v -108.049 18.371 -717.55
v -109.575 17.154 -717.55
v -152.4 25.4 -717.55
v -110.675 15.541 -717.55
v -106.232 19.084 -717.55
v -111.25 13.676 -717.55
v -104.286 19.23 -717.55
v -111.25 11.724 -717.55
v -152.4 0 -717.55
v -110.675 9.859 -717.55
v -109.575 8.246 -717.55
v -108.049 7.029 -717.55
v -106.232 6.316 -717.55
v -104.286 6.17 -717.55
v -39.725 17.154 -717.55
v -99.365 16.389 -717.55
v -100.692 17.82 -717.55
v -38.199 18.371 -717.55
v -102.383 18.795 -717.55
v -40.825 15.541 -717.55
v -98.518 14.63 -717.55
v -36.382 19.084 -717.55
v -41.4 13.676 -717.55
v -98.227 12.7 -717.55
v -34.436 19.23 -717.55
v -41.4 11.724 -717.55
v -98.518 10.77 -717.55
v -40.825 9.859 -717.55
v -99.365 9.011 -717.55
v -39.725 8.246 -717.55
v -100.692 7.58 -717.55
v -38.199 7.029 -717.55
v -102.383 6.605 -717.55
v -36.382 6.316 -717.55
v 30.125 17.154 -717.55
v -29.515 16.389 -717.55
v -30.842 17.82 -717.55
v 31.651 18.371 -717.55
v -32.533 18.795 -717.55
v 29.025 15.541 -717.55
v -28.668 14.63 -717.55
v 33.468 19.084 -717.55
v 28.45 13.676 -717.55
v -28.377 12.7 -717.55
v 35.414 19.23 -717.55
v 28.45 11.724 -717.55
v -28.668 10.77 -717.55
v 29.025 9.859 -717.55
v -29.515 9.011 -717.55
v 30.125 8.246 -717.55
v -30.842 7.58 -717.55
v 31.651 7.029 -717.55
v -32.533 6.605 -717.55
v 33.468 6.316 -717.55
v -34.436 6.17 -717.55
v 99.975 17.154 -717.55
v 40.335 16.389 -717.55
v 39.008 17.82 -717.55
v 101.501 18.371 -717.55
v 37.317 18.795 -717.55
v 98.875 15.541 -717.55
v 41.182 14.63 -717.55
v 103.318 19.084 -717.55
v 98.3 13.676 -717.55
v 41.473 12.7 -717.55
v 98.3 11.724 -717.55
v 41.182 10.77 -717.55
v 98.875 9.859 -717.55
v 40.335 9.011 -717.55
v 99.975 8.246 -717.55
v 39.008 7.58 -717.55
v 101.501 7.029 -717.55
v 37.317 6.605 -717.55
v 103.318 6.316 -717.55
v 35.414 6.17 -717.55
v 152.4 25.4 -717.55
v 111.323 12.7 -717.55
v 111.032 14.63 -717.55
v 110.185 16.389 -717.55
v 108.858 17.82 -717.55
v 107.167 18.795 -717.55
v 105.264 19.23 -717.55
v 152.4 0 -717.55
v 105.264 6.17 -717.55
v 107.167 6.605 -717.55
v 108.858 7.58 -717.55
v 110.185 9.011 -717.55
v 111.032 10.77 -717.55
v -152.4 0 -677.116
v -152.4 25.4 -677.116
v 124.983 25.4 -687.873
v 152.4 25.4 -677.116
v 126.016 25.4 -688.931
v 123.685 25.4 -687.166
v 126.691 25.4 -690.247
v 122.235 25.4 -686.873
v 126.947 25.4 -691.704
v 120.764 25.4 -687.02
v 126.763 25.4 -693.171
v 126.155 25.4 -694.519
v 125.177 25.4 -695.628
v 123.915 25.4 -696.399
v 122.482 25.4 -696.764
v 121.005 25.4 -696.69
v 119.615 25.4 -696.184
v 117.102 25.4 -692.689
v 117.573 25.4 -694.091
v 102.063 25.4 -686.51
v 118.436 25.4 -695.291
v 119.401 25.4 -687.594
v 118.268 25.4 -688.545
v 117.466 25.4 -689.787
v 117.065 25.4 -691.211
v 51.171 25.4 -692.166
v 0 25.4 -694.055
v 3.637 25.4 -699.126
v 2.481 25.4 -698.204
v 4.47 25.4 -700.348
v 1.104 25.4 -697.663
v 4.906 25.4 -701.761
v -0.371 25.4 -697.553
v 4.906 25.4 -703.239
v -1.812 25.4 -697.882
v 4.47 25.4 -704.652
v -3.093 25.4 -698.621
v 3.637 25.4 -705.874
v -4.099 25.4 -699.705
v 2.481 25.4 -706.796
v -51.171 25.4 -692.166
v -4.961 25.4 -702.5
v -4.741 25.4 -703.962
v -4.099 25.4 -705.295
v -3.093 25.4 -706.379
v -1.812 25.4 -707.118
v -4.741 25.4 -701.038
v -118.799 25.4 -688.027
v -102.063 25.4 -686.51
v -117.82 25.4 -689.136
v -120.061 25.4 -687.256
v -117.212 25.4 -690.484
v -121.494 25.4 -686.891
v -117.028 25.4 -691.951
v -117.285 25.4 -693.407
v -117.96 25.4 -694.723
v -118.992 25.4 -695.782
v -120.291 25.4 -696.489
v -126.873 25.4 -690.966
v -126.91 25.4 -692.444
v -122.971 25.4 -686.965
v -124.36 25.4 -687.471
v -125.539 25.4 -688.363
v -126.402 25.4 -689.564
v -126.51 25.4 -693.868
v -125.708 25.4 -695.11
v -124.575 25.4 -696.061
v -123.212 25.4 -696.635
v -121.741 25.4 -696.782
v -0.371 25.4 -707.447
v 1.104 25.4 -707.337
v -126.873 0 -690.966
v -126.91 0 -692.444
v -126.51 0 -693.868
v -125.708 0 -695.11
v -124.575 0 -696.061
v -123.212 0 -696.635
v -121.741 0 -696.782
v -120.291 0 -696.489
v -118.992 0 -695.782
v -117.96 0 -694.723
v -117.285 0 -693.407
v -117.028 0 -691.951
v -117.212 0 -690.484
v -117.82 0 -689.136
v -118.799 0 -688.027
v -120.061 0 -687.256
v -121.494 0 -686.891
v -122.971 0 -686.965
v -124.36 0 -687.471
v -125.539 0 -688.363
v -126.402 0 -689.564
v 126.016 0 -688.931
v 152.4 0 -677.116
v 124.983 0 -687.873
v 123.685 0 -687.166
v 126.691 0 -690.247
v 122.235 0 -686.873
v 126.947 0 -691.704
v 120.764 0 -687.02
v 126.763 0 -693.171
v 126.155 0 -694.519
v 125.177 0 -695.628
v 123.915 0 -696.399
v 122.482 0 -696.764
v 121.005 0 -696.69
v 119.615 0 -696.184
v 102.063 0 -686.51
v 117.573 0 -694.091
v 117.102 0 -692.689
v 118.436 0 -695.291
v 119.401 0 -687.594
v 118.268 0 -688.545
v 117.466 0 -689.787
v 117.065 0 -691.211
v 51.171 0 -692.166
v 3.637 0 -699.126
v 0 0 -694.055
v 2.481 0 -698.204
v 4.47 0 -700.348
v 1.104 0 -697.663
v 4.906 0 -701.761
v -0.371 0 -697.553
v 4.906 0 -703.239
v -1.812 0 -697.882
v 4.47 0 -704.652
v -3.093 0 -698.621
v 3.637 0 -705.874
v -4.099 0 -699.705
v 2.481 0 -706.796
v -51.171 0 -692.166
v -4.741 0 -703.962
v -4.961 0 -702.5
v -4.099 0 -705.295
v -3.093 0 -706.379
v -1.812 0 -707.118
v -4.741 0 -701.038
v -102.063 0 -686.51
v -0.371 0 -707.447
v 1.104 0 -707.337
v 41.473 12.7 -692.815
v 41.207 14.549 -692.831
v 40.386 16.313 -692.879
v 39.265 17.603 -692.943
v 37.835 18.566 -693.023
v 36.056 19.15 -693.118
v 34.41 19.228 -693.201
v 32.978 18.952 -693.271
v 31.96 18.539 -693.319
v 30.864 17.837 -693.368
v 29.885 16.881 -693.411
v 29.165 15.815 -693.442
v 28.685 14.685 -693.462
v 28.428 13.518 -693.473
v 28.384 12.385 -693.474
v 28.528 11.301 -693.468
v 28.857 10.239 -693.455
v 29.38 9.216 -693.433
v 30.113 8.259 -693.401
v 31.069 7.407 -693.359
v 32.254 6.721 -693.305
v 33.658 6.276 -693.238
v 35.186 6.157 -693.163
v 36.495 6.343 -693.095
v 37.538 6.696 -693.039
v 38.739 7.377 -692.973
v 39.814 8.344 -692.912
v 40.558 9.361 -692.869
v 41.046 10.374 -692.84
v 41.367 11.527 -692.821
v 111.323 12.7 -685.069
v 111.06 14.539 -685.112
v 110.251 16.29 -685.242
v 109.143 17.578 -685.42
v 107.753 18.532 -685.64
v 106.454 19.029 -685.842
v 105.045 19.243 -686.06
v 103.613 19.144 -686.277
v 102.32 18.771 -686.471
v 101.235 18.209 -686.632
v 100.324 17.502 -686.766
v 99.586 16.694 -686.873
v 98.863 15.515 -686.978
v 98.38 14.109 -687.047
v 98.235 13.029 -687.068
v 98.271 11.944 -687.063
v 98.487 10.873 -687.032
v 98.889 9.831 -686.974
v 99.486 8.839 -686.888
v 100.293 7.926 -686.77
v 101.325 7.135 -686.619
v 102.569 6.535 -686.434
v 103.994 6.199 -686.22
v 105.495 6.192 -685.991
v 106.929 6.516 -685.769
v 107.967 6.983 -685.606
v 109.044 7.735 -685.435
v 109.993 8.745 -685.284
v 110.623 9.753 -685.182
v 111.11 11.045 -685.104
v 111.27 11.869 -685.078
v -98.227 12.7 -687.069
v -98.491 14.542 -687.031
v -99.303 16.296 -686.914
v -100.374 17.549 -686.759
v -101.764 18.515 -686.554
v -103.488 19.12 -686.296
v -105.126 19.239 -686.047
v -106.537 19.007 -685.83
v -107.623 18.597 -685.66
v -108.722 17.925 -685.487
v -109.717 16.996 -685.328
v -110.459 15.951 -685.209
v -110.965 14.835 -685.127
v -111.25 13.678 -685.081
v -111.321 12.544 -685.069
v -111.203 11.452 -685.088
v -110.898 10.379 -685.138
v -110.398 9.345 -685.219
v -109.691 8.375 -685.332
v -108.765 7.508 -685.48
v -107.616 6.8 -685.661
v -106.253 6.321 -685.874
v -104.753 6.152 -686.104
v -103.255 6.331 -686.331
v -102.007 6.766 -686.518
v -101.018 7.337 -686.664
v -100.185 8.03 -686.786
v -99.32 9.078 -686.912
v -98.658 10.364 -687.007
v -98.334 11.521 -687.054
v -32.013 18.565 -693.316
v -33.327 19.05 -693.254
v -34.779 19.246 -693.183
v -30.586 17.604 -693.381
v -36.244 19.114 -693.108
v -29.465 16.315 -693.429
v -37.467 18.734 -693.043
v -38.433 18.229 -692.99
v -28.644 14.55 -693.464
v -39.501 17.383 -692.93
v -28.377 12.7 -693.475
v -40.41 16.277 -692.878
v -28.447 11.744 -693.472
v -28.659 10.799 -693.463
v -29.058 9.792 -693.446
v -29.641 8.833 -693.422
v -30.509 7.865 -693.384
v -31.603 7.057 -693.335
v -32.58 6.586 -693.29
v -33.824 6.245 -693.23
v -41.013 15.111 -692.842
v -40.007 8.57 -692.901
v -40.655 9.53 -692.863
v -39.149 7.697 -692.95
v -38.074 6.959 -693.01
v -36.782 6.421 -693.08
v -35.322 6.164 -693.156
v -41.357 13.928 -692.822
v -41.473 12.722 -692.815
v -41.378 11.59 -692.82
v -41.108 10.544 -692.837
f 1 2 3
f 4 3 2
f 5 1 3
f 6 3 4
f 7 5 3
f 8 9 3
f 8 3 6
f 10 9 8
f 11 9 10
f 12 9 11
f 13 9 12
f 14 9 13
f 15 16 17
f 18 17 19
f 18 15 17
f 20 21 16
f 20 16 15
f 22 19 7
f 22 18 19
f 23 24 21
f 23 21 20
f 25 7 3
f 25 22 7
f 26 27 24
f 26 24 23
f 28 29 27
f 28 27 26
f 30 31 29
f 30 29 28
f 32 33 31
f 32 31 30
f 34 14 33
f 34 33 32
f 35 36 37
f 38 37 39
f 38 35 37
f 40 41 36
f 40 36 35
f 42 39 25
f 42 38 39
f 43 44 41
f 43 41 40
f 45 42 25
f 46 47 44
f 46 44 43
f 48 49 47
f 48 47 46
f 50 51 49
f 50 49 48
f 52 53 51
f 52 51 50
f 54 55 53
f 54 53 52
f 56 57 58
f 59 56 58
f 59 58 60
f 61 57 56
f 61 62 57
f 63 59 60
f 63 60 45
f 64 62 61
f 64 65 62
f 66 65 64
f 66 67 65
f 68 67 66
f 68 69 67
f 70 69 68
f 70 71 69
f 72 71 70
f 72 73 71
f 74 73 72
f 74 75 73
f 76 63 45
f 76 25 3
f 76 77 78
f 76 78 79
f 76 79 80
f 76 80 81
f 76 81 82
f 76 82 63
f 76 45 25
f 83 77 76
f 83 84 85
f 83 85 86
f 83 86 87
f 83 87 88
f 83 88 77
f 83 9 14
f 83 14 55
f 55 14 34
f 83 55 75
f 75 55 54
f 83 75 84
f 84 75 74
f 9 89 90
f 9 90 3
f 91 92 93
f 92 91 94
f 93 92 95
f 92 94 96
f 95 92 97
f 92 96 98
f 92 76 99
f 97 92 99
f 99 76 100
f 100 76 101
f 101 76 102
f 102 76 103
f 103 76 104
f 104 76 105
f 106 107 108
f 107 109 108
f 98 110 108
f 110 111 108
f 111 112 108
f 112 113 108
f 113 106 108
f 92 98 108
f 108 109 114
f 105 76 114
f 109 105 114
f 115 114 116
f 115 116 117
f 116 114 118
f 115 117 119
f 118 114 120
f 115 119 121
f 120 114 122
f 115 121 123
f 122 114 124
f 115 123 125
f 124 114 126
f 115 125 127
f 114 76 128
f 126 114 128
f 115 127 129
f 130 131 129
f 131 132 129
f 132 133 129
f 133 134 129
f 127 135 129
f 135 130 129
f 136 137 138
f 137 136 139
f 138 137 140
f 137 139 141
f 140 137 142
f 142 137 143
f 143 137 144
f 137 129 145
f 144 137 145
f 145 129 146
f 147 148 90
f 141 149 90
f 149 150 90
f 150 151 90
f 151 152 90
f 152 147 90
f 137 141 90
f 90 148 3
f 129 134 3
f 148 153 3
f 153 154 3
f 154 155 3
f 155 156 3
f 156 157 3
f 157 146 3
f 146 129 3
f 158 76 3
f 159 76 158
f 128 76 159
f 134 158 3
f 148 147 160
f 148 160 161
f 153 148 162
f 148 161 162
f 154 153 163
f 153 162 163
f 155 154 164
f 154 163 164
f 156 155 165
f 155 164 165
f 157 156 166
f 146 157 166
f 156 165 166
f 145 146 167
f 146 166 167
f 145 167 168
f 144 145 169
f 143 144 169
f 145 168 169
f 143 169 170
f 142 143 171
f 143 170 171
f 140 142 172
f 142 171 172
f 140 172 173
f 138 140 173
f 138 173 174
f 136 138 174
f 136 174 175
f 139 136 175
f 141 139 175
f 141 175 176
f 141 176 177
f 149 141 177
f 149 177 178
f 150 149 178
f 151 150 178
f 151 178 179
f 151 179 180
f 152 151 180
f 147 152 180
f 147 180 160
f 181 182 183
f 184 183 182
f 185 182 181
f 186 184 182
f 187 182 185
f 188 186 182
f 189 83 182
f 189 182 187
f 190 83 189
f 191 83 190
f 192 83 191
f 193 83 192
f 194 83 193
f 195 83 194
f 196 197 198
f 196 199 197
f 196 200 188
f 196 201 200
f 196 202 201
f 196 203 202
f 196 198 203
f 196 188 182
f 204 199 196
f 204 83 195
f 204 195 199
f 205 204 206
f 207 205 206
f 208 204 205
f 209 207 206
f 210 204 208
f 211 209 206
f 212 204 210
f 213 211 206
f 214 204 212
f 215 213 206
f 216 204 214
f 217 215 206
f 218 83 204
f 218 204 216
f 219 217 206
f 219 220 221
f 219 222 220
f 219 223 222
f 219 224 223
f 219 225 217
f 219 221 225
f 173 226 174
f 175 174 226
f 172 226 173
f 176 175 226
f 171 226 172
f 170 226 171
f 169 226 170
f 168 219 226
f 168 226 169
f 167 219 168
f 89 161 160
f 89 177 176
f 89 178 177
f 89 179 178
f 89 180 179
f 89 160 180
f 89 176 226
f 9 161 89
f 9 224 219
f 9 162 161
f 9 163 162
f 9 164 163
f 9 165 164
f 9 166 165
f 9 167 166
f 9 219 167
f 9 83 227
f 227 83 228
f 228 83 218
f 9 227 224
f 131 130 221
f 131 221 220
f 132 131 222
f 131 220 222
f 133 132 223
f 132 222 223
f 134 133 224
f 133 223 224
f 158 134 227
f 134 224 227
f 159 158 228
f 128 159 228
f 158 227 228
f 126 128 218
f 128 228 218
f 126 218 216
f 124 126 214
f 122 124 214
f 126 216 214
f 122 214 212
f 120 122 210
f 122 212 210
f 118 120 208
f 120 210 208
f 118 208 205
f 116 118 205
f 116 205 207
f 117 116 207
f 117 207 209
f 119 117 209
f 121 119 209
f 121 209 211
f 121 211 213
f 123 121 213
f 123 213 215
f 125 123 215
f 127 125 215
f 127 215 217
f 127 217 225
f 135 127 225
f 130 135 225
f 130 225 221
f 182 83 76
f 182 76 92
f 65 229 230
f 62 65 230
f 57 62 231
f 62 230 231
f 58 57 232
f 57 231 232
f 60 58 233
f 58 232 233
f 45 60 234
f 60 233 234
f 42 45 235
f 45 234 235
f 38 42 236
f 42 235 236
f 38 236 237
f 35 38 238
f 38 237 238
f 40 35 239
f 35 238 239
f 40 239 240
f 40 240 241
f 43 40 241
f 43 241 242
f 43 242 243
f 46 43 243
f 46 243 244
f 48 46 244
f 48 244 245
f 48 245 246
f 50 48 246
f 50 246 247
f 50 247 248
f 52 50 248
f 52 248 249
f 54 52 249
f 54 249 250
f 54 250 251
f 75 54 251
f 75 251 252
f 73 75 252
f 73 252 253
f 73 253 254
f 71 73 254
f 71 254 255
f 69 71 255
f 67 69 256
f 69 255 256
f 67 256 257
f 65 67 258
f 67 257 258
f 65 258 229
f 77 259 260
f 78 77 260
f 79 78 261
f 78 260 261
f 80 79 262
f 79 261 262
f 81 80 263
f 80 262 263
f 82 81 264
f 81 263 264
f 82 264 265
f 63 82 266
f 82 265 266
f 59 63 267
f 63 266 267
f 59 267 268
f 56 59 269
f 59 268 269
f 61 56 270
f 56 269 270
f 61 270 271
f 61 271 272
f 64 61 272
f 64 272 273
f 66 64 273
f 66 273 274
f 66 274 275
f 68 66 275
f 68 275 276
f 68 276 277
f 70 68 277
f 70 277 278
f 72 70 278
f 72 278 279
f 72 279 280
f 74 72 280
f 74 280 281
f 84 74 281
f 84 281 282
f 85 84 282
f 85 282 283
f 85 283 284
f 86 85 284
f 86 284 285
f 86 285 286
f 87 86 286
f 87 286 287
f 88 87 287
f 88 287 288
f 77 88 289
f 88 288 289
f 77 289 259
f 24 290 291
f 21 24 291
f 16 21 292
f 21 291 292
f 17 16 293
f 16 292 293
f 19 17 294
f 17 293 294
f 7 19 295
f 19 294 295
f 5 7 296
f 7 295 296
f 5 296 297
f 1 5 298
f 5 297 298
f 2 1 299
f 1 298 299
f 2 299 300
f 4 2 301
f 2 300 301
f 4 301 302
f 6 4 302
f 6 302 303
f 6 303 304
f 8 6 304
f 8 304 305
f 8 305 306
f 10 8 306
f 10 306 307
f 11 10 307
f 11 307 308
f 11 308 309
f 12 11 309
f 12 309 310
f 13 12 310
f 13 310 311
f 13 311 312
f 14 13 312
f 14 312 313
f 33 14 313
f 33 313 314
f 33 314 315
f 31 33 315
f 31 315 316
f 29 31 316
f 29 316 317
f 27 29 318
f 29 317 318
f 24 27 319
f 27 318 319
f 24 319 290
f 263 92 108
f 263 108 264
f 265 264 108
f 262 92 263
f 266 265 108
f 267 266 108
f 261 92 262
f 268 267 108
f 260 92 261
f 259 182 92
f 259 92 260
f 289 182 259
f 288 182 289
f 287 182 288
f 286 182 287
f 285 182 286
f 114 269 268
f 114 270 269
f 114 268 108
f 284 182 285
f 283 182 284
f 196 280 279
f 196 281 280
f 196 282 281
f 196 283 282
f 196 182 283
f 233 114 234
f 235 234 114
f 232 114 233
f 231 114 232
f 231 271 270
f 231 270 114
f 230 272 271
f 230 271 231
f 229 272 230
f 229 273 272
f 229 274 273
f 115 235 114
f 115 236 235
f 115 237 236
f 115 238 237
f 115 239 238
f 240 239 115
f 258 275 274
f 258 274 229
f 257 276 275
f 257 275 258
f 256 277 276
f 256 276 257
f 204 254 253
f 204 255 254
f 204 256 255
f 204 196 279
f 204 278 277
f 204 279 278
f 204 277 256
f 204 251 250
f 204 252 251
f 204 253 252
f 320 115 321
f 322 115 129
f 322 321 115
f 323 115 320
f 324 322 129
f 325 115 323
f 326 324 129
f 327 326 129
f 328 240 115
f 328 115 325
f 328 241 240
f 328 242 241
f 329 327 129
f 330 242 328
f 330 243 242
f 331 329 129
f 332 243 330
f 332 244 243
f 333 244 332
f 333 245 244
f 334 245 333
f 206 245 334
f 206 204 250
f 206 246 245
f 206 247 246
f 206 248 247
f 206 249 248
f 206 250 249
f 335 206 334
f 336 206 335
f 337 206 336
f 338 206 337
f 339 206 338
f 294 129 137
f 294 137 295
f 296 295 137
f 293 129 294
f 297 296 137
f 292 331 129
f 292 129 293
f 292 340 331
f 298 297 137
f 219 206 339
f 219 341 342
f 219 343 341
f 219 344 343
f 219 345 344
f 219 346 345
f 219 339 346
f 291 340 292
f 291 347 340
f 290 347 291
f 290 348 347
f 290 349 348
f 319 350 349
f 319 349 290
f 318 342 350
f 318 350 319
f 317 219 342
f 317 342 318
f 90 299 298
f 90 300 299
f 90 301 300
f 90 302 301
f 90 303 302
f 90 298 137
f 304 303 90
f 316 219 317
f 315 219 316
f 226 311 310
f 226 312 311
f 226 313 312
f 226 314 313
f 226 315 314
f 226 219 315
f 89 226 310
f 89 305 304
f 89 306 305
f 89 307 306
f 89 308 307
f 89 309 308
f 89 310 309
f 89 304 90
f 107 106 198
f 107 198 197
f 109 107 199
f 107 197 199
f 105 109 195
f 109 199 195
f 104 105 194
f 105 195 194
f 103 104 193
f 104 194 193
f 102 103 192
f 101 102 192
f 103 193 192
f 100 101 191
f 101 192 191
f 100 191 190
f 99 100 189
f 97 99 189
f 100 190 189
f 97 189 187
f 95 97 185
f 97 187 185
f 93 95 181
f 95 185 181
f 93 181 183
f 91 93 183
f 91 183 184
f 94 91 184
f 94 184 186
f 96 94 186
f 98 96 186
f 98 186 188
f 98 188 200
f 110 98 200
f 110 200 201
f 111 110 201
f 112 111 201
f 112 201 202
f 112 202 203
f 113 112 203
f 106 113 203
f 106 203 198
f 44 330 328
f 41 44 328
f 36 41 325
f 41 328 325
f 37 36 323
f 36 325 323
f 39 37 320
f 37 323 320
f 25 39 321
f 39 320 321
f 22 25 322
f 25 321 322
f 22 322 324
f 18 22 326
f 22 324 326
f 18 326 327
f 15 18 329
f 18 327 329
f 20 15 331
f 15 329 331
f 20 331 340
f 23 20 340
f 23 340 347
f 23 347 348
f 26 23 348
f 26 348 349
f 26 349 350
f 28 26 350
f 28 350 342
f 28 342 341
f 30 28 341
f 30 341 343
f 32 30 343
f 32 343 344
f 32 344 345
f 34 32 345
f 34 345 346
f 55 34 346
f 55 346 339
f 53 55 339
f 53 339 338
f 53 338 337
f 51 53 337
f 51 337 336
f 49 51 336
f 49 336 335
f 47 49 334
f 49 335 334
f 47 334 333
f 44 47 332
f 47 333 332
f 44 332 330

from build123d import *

# Parameters (mm, degrees)
BOSS_EXTRUDE1_DEPTH                = 25.4
F_25_64_0_39063_DIAMETER_HOLE1_D   = 9.922002
CIRPATTERN4_COUNT                  = 36
TAPPED_HOLE_FOR_1_2_13_HELICOIL1_D = 13.09624
LPATTERN1_COUNT                    = 4
LPATTERN1_PITCH                    = 69.85


with BuildPart() as part:
    # Sketch1 → Boss-Extrude1 (new body)
    with BuildSketch(Plane(origin=(0, 0, 0), x_dir=(1, 0, 0), z_dir=(0, 1, 0))):
        with BuildLine():
            Line((-152.4, 677.116373325), (-152.4, 717.55))
            Line((-152.4, 717.55), (152.4, 717.55))
            Line((152.4, 717.55), (152.4, 677.116373325))
            ThreePointArc((152.4, 677.116373325), (0, 694.055), (-152.4, 677.116373325))
        make_face()
    extrude(amount=BOSS_EXTRUDE1_DEPTH)

    # 25/64 (0.39063) Diameter Hole1 (through all)
    with Locations(Plane(origin=(0, 25.4, 0), x_dir=(1, 0, 0), z_dir=(0, 1, 0))):
        with Locations((0, 702.5)):
            f_25_64_0_39063_diameter_hole1 = Hole(F_25_64_0_39063_DIAMETER_HOLE1_D / 2)

    # CirPattern4: 25/64 (0.39063) Diameter Hole1 ×36 about axis, 33 skipped
    cirpattern4_axis = Axis((0, 0, 0), (0, -1, 0))
    add([f_25_64_0_39063_diameter_hole1.rotate(cirpattern4_axis, i * 360 / CIRPATTERN4_COUNT) for i in range(1, CIRPATTERN4_COUNT) if i not in (2, 3, 4, 5, 6, 7, 8, 9, 10, 11, 12, 13, 14, 15, 16, 17, 18, 19, 20, 21, 22, 23, 24, 25, 26, 27, 28, 29, 30, 31, 32, 33, 34)], mode=Mode.SUBTRACT)

    # Tapped Hole for 1/2-13 Helicoil1 (through all)
    with Locations(Plane(origin=(0, 0, -717.55), x_dir=(-1, 0, 0), z_dir=(0, 0, -1))):
        with Locations((-104.775, 12.7)):
            tapped_hole_for_1_2_13_helicoil1 = Hole(TAPPED_HOLE_FOR_1_2_13_HELICOIL1_D / 2)

    # LPattern1: Tapped Hole for 1/2-13 Helicoil1 ×4
    with Locations(*[(-i * LPATTERN1_PITCH, 0, 0) for i in range(1, LPATTERN1_COUNT)]):
        add(tapped_hole_for_1_2_13_helicoil1, mode=Mode.SUBTRACT)


solid = part.part
